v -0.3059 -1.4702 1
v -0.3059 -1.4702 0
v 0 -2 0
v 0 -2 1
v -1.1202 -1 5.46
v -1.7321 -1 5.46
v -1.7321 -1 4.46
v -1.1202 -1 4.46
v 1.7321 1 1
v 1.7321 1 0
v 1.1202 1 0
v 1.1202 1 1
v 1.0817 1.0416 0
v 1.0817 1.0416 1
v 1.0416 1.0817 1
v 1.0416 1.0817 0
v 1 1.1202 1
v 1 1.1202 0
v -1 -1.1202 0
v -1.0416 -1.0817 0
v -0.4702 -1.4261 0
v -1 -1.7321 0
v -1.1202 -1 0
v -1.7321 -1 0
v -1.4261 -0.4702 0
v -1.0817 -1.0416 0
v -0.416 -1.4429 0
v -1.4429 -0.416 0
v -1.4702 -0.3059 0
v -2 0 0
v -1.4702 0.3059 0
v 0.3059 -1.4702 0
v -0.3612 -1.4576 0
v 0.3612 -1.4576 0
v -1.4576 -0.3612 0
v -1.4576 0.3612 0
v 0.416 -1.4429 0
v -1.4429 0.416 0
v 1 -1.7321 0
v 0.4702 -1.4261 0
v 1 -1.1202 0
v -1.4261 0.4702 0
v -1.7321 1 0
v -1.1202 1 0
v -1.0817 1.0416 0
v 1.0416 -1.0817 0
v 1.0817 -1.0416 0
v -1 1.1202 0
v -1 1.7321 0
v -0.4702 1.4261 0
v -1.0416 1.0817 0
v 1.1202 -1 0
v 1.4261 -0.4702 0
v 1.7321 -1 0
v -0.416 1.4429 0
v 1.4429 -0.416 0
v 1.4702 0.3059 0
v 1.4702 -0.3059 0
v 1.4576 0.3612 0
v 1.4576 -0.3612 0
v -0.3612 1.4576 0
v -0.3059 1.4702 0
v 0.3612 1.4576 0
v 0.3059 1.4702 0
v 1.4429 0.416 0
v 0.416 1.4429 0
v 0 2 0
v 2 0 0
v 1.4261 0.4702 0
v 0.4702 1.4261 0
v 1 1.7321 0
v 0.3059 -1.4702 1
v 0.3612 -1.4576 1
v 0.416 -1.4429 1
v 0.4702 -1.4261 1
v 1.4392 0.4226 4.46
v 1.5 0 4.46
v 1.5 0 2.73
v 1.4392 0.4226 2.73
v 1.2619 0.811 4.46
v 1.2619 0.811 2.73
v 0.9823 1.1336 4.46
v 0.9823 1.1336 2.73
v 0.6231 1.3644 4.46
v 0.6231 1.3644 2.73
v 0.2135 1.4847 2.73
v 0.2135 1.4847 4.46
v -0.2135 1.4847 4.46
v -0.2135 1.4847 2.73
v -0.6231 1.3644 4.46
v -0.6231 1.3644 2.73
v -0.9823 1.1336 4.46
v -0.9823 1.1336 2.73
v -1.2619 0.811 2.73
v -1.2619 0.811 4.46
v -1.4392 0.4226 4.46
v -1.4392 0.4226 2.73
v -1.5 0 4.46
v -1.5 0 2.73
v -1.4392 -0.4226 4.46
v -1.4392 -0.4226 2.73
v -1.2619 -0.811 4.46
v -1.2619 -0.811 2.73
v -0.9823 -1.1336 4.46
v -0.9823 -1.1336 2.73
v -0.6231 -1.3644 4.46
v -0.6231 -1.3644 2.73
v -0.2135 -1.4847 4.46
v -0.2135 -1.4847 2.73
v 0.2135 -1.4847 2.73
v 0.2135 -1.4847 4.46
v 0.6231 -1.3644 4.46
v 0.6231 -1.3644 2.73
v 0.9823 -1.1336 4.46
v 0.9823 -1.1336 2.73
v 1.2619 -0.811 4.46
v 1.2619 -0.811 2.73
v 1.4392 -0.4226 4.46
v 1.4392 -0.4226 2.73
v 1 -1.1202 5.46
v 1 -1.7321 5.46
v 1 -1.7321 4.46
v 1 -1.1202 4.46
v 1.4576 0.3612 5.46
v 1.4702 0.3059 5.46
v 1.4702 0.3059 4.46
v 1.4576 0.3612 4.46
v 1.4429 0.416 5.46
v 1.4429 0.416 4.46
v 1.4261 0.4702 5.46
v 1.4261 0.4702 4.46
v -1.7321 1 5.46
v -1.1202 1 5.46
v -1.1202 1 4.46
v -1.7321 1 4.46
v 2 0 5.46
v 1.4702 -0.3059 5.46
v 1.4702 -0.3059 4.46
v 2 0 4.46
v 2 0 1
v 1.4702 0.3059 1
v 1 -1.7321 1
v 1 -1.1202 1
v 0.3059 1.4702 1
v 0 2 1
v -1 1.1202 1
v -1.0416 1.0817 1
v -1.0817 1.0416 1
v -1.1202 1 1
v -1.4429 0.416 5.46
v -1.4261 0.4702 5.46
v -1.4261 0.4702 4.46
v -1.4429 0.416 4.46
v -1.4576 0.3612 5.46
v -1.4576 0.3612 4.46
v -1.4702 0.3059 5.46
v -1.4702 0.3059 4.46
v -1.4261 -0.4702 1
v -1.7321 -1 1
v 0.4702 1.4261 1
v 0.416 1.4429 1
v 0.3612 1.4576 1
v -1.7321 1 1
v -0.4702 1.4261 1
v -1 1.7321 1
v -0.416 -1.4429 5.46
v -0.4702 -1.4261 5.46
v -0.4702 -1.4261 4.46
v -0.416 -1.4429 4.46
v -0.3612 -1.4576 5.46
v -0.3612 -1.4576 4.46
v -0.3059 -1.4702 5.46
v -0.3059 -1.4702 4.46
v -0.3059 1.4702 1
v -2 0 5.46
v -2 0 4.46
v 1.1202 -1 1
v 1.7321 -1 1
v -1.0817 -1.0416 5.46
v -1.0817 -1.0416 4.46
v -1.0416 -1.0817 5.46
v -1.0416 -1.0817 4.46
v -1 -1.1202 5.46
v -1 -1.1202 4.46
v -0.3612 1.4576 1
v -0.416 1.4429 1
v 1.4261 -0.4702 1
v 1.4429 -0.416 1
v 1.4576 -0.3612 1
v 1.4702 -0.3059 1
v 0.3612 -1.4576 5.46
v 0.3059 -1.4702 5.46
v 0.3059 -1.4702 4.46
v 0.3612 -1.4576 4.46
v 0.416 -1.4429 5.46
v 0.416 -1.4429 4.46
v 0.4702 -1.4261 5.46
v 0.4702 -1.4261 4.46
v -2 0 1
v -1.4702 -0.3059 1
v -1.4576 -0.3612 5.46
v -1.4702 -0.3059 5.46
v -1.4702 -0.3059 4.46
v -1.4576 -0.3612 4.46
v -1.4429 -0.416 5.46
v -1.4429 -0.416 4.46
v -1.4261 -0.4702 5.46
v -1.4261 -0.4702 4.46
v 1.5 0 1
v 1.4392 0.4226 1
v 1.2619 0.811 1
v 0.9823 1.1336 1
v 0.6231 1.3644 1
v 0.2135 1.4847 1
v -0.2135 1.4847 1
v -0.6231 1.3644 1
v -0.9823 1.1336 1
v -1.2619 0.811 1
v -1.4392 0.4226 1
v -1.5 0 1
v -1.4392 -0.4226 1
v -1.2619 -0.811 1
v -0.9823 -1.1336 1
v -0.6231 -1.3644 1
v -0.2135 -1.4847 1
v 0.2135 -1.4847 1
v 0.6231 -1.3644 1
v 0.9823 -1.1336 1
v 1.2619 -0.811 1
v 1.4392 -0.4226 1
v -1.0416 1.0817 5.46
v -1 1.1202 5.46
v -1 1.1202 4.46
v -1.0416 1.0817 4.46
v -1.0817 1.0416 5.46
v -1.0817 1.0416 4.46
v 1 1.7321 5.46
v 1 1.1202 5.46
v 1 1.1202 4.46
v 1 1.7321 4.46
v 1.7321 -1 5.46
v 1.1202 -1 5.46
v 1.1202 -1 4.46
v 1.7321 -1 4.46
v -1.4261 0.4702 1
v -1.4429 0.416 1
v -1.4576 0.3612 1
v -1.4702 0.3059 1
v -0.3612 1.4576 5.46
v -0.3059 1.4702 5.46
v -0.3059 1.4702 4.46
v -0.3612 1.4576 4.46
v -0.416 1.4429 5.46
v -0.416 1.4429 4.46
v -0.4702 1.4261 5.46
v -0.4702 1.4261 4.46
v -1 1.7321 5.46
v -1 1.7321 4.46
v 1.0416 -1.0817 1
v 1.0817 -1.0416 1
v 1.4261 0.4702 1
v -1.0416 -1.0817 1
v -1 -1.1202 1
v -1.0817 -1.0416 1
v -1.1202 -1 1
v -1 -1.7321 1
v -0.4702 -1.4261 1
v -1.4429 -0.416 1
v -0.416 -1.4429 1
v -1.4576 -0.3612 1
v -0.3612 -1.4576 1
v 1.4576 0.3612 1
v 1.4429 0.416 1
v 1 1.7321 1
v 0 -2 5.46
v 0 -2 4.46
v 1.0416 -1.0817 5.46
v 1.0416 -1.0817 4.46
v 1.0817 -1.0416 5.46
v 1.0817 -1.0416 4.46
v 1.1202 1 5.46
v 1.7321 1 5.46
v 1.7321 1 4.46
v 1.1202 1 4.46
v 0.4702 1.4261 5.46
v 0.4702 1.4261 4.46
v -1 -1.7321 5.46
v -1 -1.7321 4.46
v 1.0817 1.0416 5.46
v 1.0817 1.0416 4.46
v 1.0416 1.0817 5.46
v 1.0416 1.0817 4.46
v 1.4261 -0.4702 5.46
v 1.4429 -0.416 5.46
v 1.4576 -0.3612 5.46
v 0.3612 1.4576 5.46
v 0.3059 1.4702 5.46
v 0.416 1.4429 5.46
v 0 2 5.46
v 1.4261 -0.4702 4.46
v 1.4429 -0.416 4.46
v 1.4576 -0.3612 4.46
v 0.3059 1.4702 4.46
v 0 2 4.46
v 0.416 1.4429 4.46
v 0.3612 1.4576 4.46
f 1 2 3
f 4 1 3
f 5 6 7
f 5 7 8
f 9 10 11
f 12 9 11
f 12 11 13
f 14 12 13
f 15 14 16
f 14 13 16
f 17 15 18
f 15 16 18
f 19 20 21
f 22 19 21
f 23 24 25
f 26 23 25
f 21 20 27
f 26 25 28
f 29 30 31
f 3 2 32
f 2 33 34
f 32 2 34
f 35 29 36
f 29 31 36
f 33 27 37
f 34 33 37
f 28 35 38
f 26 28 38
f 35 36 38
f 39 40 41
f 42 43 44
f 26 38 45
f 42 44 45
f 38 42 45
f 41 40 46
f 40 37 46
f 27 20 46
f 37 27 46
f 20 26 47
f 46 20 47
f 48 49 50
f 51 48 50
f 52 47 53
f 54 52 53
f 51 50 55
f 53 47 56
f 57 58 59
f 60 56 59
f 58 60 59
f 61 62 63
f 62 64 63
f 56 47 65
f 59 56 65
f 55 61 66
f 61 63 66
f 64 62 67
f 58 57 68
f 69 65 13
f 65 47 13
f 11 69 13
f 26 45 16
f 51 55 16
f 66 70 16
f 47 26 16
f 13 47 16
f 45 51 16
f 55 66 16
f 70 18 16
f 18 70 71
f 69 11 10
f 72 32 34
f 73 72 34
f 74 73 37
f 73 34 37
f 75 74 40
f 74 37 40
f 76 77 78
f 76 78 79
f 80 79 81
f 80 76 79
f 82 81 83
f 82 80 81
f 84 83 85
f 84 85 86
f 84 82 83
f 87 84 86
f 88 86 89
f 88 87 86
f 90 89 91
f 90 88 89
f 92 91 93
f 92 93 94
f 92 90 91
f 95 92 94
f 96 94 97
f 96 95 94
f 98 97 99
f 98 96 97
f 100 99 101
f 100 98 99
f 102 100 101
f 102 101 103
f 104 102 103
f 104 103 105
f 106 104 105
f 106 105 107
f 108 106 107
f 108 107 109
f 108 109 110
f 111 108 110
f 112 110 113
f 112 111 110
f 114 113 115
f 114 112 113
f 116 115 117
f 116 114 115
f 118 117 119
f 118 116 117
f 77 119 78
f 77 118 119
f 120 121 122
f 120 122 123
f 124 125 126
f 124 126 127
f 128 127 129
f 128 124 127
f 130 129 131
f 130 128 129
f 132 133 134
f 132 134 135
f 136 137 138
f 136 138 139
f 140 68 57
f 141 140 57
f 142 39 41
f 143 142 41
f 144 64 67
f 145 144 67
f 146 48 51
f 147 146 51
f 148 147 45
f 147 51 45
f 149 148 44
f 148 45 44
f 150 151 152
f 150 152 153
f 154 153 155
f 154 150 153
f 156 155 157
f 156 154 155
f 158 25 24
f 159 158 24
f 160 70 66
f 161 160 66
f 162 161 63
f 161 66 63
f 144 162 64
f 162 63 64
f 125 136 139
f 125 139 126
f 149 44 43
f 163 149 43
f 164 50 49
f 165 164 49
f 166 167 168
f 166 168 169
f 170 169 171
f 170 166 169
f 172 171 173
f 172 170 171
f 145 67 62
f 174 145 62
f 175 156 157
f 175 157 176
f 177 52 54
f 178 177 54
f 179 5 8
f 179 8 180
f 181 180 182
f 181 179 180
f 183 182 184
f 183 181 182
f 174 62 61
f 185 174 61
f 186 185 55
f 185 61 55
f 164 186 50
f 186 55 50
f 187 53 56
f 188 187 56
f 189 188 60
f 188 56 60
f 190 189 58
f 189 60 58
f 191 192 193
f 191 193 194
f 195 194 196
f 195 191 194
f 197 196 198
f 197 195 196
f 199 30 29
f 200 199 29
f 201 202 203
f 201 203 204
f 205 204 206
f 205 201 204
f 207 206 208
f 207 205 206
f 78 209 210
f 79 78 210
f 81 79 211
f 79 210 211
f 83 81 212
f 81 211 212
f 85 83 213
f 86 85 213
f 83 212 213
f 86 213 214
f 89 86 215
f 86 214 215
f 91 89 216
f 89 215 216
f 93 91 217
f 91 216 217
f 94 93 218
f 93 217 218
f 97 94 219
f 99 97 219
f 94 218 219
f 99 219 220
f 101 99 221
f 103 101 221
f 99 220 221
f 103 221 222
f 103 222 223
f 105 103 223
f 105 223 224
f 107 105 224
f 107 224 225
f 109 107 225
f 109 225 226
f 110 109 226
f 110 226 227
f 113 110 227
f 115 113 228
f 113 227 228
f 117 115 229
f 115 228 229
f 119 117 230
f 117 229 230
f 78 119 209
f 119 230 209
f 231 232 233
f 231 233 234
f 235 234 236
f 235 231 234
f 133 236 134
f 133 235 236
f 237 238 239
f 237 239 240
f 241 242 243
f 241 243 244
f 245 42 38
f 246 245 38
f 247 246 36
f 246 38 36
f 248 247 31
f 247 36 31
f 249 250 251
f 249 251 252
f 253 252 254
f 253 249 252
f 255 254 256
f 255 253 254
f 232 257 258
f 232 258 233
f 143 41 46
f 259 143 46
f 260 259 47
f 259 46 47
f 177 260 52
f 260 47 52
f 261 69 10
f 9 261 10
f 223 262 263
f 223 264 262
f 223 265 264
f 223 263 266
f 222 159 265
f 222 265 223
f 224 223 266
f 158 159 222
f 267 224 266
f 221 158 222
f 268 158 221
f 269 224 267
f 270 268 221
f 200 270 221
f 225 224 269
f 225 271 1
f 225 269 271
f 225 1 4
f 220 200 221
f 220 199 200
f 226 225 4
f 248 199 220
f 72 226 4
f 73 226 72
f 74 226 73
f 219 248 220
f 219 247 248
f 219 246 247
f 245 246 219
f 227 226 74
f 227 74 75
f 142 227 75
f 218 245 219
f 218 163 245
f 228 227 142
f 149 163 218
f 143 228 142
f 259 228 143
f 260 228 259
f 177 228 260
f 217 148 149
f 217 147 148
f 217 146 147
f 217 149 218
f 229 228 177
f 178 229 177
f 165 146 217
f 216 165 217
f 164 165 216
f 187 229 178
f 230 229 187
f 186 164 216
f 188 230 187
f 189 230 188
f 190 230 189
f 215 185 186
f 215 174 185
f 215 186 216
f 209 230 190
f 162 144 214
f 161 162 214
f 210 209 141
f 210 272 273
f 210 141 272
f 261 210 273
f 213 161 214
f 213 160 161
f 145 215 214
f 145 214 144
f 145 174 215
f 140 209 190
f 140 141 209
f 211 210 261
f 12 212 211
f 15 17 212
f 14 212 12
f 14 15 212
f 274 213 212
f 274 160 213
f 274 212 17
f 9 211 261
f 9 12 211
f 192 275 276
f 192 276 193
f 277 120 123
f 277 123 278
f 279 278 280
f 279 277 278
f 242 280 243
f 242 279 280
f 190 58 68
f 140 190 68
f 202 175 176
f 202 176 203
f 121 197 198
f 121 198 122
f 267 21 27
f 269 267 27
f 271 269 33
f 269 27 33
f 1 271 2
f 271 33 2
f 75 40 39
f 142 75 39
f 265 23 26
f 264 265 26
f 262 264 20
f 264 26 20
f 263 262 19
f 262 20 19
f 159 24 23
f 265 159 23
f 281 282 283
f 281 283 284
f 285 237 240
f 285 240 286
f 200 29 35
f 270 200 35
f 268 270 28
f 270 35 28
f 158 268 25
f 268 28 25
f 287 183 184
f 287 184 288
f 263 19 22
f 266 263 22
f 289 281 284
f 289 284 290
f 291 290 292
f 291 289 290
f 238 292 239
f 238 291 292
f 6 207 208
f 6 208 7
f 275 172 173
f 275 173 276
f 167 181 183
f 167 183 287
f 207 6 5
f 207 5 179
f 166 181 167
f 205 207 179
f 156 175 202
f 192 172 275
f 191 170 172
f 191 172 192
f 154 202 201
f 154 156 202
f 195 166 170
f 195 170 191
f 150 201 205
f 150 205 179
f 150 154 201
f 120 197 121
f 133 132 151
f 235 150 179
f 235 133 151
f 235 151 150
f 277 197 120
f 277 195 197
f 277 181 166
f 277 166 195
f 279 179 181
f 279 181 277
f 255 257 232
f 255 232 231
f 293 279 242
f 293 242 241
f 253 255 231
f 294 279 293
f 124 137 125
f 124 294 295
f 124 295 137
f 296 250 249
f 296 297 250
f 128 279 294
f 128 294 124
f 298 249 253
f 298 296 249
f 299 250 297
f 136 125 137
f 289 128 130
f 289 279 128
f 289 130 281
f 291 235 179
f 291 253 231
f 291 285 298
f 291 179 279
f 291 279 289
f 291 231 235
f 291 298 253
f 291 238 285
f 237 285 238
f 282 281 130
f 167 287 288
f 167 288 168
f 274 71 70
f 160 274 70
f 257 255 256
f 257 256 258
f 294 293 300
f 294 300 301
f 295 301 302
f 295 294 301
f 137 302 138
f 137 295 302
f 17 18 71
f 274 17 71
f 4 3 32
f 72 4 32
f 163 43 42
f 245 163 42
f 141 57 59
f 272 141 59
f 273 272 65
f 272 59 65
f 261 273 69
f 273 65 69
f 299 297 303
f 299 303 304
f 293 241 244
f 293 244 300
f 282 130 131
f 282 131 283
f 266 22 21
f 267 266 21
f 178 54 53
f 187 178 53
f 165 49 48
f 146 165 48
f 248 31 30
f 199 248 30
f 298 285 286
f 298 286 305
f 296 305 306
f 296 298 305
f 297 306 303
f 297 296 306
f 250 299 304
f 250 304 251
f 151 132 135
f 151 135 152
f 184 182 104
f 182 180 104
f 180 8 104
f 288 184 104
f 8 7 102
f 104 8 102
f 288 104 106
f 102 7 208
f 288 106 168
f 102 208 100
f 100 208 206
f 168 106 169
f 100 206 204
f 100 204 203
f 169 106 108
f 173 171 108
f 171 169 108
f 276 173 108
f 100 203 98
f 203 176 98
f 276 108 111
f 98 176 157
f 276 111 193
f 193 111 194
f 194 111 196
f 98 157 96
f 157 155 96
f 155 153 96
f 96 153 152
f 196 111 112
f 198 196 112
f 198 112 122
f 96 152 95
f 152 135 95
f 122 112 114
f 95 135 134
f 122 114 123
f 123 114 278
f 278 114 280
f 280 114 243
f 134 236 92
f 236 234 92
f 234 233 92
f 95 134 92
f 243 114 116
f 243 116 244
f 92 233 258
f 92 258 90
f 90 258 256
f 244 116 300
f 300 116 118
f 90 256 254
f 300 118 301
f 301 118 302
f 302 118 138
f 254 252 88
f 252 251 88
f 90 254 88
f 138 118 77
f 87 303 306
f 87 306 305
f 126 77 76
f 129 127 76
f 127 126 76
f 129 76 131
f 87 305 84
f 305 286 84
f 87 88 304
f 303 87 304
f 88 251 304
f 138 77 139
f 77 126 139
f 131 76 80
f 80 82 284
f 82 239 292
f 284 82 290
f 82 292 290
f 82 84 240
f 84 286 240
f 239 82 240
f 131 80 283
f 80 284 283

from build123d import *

# Parameters (mm, degrees)
IZIM1_R                     = 2
Y_KSEKLIK_EKSTR_ZYON1_DEPTH = 1
IZIM2_R                     = 1.5
Y_KSEKLIK_EKSTR_ZYON2_DEPTH = 1.73
KES_EKSTR_ZYON1_DEPTH       = 2


with BuildPart() as part:
    # Çizim1 → Yükseklik-Ekstrüzyon1 (new body)
    with BuildSketch(Plane.XY):
        Circle(IZIM1_R)
    extrude(amount=Y_KSEKLIK_EKSTR_ZYON1_DEPTH)

    # Çizim2 → Yükseklik-Ekstrüzyon2 (add)
    with BuildSketch(Plane.XY.offset(1)):
        Circle(IZIM2_R)
    extrude(amount=Y_KSEKLIK_EKSTR_ZYON2_DEPTH)

    # Çizim3 → Kes-Ekstrüzyon1 (cut)
    with BuildSketch(Plane(origin=(0, 0, 0), x_dir=(-1, 0, 0), z_dir=(0, 0, -1))):
        with BuildLine():
            Line((-0.305902622, 1.470161116), (0, 2))
            ThreePointArc((0, 2), (-0.51763809, 1.931851653), (-1, 1.732050808))
            Line((-1, 1.732050808), (-0.470161116, 1.426148185))
            ThreePointArc((-0.470161116, 1.426148185), (-0.388655395, 1.45048168), (-0.305902622, 1.470161116))
        make_face()
        with BuildLine():
            Line((-1, 1.120245563), (-1, 1.732050808))
            ThreePointArc((-1, 1.732050808), (-1.414213562, 1.414213562), (-1.732050808, 1))
            Line((-1.732050808, 1), (-1.120245563, 1))
            ThreePointArc((-1.120245563, 1), (-1.061826285, 1.061826285), (-1, 1.120245563))
        make_face()
        with BuildLine():
            Line((-1.426148185, 0.470161116), (-1.732050808, 1))
            ThreePointArc((-1.732050808, 1), (-1.931851653, 0.51763809), (-2, 0))
            Line((-2, 0), (-1.470161116, 0.305902622))
            ThreePointArc((-1.470161116, 0.305902622), (-1.45048168, 0.388655395), (-1.426148185, 0.470161116))
        make_face()
        with BuildLine():
            Line((-1.470161116, -0.305902622), (-2, 0))
            ThreePointArc((-2, 0), (-1.931851653, -0.51763809), (-1.732050808, -1))
            Line((-1.732050808, -1), (-1.426148185, -0.470161116))
            ThreePointArc((-1.426148185, -0.470161116), (-1.45048168, -0.388655395), (-1.470161116, -0.305902622))
        make_face()
        with BuildLine():
            Line((-1.120245563, -1), (-1.732050808, -1))
            ThreePointArc((-1.732050808, -1), (-1.414213562, -1.414213562), (-1, -1.732050808))
            Line((-1, -1.732050808), (-1, -1.120245563))
            ThreePointArc((-1, -1.120245563), (-1.061826285, -1.061826285), (-1.120245563, -1))
        make_face()
        with BuildLine():
            ThreePointArc((-1, -1.732050808), (-0.51763809, -1.931851653), (0, -2))
            Line((0, -2), (-0.305902622, -1.470161116))
            ThreePointArc((-0.305902622, -1.470161116), (-0.388655395, -1.45048168), (-0.470161116, -1.426148185))
            Line((-0.470161116, -1.426148185), (-1, -1.732050808))
        make_face()
        with BuildLine():
            ThreePointArc((0, -2), (0.51763809, -1.931851653), (1, -1.732050808))
            Line((1, -1.732050808), (0.470161116, -1.426148185))
            ThreePointArc((0.470161116, -1.426148185), (0.388655395, -1.45048168), (0.305902622, -1.470161116))
            Line((0.305902622, -1.470161116), (0, -2))
        make_face()
        with BuildLine():
            ThreePointArc((1, -1.732050808), (1.414213562, -1.414213562), (1.732050808, -1))
            Line((1.732050808, -1), (1.120245563, -1))
            ThreePointArc((1.120245563, -1), (1.061826285, -1.061826285), (1, -1.120245563))
            Line((1, -1.120245563), (1, -1.732050808))
        make_face()
        with BuildLine():
            ThreePointArc((1.732050808, -1), (1.931851653, -0.51763809), (2, 0))
            Line((2, 0), (1.470161116, -0.305902622))
            ThreePointArc((1.470161116, -0.305902622), (1.45048168, -0.388655395), (1.426148185, -0.470161116))
            Line((1.426148185, -0.470161116), (1.732050808, -1))
        make_face()
        with BuildLine():
            ThreePointArc((2, 0), (1.931851653, 0.51763809), (1.732050808, 1))
            Line((1.732050808, 1), (1.426148185, 0.470161116))
            ThreePointArc((1.426148185, 0.470161116), (1.45048168, 0.388655395), (1.470161116, 0.305902622))
            Line((1.470161116, 0.305902622), (2, 0))
        make_face()
        with BuildLine():
            ThreePointArc((1.732050808, 1), (1.414213562, 1.414213562), (1, 1.732050808))
            Line((1, 1.732050808), (1, 1.120245563))
            ThreePointArc((1, 1.120245563), (1.061826285, 1.061826285), (1.120245563, 1))
            Line((1.120245563, 1), (1.732050808, 1))
        make_face()
        with BuildLine():
            Line((0.470161116, 1.426148185), (1, 1.732050808))
            ThreePointArc((1, 1.732050808), (0.51763809, 1.931851653), (0, 2))
            Line((0, 2), (0.305902622, 1.470161116))
            ThreePointArc((0.305902622, 1.470161116), (0.388655395, 1.45048168), (0.470161116, 1.426148185))
        make_face()
    extrude(amount=-KES_EKSTR_ZYON1_DEPTH, mode=Mode.SUBTRACT)

    # Aynalama3: part across plane


with BuildPart() as part_1:
    add(part.part)
    add(part.part.mirror(Plane.XY.offset(2.73)))


solid = part_1.part
